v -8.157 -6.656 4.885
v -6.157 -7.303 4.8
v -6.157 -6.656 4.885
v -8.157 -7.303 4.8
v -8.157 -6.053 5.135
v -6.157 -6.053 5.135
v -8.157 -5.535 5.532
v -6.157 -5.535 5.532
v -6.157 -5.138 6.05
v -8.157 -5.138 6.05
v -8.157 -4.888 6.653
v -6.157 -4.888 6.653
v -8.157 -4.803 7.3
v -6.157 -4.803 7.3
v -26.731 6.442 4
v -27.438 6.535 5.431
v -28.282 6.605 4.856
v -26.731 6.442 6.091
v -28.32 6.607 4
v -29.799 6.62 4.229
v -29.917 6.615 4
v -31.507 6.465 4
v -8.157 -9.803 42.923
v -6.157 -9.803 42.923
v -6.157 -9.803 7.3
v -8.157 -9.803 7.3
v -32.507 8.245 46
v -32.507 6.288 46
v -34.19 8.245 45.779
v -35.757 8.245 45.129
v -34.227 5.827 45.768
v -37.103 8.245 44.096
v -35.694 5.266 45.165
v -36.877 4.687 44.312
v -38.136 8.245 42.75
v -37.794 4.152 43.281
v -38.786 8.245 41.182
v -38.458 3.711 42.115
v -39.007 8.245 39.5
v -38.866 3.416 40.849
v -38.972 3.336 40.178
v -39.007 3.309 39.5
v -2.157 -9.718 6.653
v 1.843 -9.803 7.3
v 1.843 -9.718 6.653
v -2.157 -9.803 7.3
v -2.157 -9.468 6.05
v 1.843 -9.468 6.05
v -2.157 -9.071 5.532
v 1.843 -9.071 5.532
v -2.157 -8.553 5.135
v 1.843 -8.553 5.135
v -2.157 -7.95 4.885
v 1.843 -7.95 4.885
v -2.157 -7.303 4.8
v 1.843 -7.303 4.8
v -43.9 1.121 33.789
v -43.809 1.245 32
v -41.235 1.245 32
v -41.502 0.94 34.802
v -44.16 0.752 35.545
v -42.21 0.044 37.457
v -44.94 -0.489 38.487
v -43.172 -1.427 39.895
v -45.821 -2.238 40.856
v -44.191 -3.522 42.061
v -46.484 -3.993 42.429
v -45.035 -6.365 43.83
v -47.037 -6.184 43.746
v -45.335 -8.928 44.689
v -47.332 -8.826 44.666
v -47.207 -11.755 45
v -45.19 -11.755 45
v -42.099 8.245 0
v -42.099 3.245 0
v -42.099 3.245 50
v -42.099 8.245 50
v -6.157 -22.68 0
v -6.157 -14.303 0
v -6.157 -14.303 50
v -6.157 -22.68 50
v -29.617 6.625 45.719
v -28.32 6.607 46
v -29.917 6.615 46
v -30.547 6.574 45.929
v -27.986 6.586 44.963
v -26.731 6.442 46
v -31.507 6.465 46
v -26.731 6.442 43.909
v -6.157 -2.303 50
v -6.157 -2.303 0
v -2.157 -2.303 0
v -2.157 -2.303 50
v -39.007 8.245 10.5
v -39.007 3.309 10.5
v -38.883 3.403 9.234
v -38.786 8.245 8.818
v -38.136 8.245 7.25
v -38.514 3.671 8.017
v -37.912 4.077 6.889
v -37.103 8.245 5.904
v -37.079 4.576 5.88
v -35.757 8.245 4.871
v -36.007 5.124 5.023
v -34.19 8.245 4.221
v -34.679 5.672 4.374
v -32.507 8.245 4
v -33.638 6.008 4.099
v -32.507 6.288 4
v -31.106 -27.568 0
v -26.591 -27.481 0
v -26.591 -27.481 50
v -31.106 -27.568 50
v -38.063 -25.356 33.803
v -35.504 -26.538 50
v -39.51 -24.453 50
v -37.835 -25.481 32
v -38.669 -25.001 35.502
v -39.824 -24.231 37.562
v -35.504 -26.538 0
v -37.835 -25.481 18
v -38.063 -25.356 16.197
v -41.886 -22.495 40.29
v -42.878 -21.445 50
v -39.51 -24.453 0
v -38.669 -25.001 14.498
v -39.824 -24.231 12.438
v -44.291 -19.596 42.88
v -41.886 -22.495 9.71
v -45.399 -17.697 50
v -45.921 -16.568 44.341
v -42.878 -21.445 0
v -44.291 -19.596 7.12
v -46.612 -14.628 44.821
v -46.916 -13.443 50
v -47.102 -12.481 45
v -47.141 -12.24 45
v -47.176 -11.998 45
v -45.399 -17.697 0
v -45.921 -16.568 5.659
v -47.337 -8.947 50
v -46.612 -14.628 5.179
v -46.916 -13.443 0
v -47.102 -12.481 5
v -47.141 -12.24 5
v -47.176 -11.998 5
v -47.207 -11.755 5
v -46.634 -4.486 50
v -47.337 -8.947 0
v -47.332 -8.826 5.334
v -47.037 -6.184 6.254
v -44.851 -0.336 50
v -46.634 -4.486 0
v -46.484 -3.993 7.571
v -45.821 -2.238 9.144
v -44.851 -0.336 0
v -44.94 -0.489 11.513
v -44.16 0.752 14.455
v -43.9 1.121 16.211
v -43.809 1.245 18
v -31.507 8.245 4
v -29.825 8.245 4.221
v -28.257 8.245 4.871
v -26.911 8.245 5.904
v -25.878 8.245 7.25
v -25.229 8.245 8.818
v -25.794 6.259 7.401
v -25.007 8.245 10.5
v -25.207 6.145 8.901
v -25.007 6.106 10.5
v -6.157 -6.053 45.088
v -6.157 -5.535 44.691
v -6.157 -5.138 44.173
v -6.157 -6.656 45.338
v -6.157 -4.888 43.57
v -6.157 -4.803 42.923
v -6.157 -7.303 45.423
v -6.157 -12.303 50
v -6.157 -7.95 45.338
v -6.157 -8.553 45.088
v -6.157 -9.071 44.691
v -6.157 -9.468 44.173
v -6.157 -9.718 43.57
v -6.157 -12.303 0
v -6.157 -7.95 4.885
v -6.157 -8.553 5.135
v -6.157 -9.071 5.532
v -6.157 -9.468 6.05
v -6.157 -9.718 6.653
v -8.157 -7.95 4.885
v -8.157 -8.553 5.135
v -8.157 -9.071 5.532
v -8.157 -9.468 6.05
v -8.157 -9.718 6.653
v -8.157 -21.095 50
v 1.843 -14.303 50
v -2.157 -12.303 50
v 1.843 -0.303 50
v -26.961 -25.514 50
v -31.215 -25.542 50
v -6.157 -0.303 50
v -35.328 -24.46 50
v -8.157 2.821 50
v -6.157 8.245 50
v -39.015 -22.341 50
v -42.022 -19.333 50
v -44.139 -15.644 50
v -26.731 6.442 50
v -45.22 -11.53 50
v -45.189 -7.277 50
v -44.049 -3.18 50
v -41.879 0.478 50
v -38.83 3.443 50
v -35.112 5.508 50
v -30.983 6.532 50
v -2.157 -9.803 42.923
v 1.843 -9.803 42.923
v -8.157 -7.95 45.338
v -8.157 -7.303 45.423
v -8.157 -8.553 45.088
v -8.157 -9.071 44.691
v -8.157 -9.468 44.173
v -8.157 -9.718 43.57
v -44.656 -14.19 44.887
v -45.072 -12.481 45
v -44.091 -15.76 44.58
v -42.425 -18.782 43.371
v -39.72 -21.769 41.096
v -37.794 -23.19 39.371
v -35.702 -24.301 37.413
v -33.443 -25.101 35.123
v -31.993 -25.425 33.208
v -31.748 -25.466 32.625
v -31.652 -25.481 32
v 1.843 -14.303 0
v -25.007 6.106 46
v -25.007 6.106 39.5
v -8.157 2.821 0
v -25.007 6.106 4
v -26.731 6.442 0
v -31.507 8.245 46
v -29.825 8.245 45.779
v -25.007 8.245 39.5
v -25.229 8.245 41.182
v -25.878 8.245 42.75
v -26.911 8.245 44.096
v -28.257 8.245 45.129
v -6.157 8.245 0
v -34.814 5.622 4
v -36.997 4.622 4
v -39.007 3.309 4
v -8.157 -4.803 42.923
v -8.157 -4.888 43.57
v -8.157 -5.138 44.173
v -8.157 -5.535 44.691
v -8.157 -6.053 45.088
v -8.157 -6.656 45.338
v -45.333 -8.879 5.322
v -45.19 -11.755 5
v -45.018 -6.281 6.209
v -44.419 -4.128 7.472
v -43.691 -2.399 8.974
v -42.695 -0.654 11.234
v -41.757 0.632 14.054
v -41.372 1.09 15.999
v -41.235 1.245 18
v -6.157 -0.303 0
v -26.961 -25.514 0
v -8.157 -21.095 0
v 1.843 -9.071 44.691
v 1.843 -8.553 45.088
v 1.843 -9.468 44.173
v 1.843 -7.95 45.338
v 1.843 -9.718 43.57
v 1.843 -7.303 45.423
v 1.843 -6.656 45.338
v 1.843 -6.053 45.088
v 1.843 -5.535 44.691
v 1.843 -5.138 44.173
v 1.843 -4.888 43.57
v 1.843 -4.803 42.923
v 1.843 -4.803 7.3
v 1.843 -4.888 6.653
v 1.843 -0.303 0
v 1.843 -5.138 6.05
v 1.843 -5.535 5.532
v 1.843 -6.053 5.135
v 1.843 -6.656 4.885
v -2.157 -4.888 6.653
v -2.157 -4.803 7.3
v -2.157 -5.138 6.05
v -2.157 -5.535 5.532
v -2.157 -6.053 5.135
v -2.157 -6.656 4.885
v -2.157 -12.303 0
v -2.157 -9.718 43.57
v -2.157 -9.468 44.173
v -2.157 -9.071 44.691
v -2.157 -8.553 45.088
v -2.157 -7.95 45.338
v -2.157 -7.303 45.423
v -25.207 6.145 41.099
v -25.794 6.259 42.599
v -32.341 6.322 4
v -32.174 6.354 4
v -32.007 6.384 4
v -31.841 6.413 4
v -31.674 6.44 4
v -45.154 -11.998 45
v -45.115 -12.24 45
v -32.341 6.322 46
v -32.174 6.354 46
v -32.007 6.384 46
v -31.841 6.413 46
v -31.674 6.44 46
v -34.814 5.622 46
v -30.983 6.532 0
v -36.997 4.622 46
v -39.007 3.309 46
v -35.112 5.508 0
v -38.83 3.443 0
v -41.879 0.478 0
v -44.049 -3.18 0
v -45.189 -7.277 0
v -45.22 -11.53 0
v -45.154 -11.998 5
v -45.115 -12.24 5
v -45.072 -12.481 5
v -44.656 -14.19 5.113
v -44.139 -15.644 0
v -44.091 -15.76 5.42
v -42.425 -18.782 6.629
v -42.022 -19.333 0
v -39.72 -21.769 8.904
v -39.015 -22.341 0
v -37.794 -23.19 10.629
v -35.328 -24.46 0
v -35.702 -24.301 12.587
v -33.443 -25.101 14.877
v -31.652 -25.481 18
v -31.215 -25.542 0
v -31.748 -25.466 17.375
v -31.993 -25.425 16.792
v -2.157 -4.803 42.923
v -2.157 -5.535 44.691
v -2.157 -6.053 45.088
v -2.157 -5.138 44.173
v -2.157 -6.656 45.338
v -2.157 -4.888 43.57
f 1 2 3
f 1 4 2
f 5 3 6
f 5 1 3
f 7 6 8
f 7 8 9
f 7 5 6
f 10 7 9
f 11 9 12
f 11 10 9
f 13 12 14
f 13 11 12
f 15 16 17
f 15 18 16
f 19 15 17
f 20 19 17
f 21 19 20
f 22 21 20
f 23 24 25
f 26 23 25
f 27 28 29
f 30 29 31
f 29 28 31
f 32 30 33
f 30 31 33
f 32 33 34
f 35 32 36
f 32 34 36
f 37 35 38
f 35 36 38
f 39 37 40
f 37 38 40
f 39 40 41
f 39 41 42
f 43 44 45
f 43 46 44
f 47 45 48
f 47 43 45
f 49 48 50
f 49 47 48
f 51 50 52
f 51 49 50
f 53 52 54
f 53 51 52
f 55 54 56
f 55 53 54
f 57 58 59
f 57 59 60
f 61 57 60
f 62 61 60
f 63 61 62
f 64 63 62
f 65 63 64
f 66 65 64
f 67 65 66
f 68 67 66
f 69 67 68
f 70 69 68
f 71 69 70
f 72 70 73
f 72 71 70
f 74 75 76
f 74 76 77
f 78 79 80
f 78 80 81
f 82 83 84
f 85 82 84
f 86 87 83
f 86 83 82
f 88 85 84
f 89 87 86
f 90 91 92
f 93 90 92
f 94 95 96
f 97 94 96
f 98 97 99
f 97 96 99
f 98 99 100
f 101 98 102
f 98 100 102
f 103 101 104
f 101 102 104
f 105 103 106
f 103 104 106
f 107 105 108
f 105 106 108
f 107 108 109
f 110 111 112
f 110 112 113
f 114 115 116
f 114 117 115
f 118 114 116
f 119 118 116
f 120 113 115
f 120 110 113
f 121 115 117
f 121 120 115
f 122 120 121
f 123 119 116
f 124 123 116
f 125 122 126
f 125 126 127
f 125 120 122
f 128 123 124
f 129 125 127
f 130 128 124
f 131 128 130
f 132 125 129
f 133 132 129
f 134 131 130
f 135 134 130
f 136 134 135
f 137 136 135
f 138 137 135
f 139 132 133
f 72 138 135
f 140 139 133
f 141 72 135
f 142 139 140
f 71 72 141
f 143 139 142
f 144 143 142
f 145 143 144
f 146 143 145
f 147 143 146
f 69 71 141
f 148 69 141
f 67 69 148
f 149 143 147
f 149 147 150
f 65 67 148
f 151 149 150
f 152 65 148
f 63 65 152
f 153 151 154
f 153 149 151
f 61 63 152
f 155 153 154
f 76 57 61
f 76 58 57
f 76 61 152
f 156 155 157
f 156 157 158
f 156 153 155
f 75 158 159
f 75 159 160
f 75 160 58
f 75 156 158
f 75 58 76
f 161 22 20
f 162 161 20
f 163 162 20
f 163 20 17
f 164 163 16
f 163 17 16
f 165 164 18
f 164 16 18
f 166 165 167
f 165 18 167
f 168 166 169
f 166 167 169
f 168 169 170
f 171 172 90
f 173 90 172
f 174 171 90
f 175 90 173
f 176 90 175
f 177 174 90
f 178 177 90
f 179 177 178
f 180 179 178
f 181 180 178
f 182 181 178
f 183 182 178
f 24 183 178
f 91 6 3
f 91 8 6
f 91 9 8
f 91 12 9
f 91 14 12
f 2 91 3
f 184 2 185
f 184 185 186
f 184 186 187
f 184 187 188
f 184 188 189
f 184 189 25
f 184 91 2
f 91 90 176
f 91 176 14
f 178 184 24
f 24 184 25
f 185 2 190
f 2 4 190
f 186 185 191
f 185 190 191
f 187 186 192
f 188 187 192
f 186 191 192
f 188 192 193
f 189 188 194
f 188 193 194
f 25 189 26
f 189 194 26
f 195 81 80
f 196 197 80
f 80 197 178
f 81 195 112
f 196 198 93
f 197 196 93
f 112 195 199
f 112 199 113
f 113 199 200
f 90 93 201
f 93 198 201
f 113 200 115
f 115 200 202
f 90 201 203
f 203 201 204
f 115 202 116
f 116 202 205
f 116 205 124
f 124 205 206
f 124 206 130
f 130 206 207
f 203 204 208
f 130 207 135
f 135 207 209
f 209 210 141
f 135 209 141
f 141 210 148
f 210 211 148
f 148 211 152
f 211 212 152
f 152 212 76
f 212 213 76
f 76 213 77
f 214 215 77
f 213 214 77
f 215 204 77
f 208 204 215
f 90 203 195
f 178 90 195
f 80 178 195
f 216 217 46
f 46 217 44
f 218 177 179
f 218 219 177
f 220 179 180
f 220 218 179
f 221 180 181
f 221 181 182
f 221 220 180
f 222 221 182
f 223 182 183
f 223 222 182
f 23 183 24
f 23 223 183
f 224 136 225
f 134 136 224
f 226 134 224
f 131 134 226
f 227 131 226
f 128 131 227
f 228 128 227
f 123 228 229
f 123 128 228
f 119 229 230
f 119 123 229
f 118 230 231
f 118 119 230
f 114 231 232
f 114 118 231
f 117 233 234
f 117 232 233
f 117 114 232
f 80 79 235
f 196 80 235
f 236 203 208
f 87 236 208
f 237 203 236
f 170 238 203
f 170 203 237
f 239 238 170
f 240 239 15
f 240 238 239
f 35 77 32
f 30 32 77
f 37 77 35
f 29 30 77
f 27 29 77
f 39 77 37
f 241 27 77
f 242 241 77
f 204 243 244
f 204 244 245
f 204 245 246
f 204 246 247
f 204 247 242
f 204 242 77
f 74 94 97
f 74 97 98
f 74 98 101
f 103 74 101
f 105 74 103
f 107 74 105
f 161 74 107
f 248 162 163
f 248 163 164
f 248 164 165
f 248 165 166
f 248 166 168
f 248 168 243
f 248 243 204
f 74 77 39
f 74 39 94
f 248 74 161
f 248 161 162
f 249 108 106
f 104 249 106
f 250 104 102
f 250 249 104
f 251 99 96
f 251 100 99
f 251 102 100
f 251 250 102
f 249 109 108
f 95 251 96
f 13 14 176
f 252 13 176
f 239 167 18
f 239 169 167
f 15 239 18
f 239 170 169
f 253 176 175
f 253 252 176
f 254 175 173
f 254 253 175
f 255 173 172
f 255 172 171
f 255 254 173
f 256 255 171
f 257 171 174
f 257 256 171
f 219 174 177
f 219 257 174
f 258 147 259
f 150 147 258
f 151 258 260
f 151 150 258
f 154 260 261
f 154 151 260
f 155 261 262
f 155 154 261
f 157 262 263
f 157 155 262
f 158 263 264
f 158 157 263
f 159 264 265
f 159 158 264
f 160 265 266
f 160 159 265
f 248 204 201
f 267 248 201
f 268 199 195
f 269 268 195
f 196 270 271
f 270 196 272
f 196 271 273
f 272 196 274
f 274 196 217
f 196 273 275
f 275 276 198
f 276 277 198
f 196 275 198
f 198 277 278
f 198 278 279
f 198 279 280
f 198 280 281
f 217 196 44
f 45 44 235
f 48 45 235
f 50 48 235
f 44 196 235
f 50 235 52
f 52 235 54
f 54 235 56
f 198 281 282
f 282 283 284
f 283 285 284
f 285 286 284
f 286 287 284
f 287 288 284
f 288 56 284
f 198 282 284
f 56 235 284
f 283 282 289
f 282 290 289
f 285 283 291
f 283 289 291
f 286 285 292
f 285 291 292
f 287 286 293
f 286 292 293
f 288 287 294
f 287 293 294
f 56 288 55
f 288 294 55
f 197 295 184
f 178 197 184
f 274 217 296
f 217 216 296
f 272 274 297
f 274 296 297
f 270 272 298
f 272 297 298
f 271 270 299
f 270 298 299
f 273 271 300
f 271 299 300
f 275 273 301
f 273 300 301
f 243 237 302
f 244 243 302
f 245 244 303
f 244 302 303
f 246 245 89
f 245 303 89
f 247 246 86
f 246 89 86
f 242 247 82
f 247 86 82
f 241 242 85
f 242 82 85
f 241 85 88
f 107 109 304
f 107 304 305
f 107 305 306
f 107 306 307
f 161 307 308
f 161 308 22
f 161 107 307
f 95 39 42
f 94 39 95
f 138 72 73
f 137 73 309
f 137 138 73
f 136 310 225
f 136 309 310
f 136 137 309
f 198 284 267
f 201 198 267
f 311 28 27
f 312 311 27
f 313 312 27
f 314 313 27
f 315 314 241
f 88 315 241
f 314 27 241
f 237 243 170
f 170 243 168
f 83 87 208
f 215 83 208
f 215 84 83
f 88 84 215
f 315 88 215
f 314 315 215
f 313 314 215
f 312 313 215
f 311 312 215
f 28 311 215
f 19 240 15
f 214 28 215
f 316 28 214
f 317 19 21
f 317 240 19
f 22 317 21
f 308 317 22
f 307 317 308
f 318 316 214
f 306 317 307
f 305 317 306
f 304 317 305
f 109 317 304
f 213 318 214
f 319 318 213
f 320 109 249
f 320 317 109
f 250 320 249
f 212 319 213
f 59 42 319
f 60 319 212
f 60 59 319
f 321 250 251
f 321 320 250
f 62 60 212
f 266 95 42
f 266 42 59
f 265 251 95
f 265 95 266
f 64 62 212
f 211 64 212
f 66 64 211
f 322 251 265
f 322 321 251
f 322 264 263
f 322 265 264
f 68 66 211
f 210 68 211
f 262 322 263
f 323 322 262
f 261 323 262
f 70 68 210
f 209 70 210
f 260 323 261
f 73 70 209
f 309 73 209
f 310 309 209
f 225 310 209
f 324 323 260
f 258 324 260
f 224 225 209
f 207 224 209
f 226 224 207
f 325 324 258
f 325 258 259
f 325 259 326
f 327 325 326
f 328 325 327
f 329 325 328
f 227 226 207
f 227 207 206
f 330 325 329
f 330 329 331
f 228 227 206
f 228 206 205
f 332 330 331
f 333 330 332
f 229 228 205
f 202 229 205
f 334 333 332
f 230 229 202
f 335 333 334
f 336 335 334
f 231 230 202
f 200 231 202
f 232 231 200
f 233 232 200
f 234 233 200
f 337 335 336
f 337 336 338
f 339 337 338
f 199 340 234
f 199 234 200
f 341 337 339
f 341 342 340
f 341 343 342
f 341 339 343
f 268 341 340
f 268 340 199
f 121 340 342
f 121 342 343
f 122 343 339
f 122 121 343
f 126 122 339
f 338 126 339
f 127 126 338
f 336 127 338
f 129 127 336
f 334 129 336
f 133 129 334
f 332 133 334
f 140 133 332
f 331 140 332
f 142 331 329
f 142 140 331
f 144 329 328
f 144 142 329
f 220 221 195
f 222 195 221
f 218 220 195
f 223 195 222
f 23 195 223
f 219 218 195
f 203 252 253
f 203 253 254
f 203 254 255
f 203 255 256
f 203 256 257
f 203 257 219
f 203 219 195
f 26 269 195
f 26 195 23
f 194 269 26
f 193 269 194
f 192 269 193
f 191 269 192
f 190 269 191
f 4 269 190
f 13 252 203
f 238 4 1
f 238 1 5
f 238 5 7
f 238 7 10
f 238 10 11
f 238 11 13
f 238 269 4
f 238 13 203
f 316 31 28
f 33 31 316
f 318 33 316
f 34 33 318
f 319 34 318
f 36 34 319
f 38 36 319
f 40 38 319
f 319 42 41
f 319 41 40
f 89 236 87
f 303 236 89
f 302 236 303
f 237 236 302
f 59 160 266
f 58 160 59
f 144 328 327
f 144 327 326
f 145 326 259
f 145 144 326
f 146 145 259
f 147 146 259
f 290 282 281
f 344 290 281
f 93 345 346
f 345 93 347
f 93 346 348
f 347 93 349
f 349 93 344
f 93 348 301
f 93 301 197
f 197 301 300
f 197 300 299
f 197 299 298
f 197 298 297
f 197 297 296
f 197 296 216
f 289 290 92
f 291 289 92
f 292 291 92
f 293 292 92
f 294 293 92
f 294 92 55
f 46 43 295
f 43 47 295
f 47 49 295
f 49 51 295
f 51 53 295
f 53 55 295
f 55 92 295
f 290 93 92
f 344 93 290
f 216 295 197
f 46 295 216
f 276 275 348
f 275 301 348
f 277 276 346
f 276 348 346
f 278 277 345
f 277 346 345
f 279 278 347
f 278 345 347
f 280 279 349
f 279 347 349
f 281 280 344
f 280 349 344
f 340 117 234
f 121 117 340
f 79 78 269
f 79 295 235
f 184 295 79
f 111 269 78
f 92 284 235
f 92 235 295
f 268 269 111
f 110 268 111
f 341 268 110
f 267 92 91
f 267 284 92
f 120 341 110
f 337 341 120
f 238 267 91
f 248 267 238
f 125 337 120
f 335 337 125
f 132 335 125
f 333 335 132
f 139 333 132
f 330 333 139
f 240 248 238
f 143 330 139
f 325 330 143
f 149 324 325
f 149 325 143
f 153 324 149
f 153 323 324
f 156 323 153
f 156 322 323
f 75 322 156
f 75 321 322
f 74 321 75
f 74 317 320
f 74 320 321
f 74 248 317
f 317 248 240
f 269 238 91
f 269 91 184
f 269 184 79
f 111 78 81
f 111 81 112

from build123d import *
from OCP.BRepAlgoAPI import BRepAlgoAPI_Cut
from OCP.TopTools import TopTools_ListOfShape

# Parameters (mm, degrees)
SALIENTE_EXTRUIR1_DEPTH     = 50
SALIENTE_EXTRUIR2_DEPTH     = 50
CORTAR_EXTRUIR12_REACH      = 77.399
REDONDEO1_R                 = 2.5
CORTAR_EXTRUIR17_REACH      = 77.931
CORTAR_EXTRUIR17_END_RADIUS = 16.15
CORTAR_EXTRUIR19_REACH      = 79.662
CROQUIS18_W                 = 7
CROQUIS18_H                 = 42
CORTAR_EXTRUIR22_REACH      = 79.662
CORTAR_EXTRUIR22_END_RADIUS = 16.15
CROQUIS22_W                 = 7
CROQUIS22_H                 = 42
REDONDEO10_START            = 3.308867588
REDONDEO10_DEPTH            = 4.936164621
REDONDEO10_START_2          = 6.105712769
REDONDEO10_2_DEPTH          = 2.13931944
REDONDEO10_START_3          = 4
REDONDEO10_3_DEPTH          = 42


with BuildPart() as part:
    # Croquis3 → Saliente-Extruir1 (new body)
    with BuildSketch(Plane.XY):
        with BuildLine():
            Line((-42.099195701, 8.245032209), (-6.157247249, 8.245032209))
            Line((-6.157247249, 8.245032209), (-6.157247249, -22.679560551))
            Line((-6.157247249, -22.679560551), (-26.590955846, -27.481197975))
            ThreePointArc((-26.590955846, -27.481197975), (-45.398833914, -17.697170572), (-42.099195701, 3.245032209))
            Line((-42.099195701, 3.245032209), (-42.099195701, 8.245032209))
        make_face()
        with BuildLine():
            Line((-8.157247249, 2.82108494), (-26.731262437, 6.441781026))
            ThreePointArc((-26.731262437, 6.441781026), (-45.345288804, -9.402744466), (-26.961453667, -25.513783269))
            Line((-26.961453667, -25.513783269), (-8.157247249, -21.095056202))
            Line((-8.157247249, -21.095056202), (-8.157247249, 2.82108494))
        make_face(mode=Mode.SUBTRACT)
    extrude(amount=SALIENTE_EXTRUIR1_DEPTH)

    # Croquis11 → Saliente-Extruir2 (add)
    with BuildSketch(Plane(origin=(0, 0, 0), x_dir=(-1, 0, 0), z_dir=(0, 0, -1))):
        Polygon((-1.842752751, -14.302804028), (-1.842752751, -0.302804028), (6.157247249, -0.302804028), (6.157247249, -2.302804028), (2.157247249, -2.302804028), (2.157247249, -12.302804028), (6.157247249, -12.302804028), (6.157247249, -14.302804028), align=None)
    extrude(amount=-SALIENTE_EXTRUIR2_DEPTH)

    # Cortar-Extruir12: up to this face of the body (flat: up to its plane)
    cortar_extruir12_end = Plane(part.part.faces().sort_by_distance((-8.157247249, -9.136985631, 25))[0])
    # Croquis12 → Cortar-Extruir12 (cut, up to the picked face)
    with BuildSketch(Plane(origin=(1.842752751, 0, 0), x_dir=(0, 0, -1), z_dir=(1, 0, 0)), mode=Mode.PRIVATE) as cortar_extruir12_sk1:
        Polygon((-25, -9.802804028), (-4.8, -9.802804028), (-4.8, -4.802804028), (-45.42287301, -4.802804028), (-45.42287301, -9.802804028), align=None)
    cortar_extruir12_tool1 = split(extrude(cortar_extruir12_sk1.sketch, amount=-CORTAR_EXTRUIR12_REACH, mode=Mode.PRIVATE), bisect_by=cortar_extruir12_end, keep=Keep.BOTH, mode=Mode.PRIVATE)
    add(cortar_extruir12_tool1.solids().sort_by(Axis((1.842753, -7.302804, 25.111437), (-1, 0, 0)))[0], mode=Mode.SUBTRACT)

    # Redondeo1
    redondeo1_edges = [part.edges().sort_by_distance(p)[0] for p in [
        (-0.157247249, -4.802804028, 4.8),
        (-0.157247249, -9.802804028, 4.8),
        (-0.157247249, -9.802804028, 45.42287301),
        (-0.157247249, -4.802804028, 45.42287301),
        (-7.157247249, -9.802804028, 4.8),
        (-7.157247249, -4.802804028, 4.8),
        (-7.157247249, -9.802804028, 45.42287301),
        (-7.157247249, -4.802804028, 45.42287301),
    ]]
    fillet(redondeo1_edges, radius=REDONDEO1_R - 0.0001)  # a hair under: the kernel refuses the full size

    # Cortar-Extruir17: up to this cylinder (the profile starts outside it)
    cortar_extruir17_end = Plane(origin=(-29.1957078, -9.519077631, 25), z_dir=(0, 0, -1)) * Cylinder(CORTAR_EXTRUIR17_END_RADIUS, 189.162, mode=Mode.PRIVATE)
    # Croquis16 → Cortar-Extruir17 (cut, up to the surface)
    with BuildSketch(Plane.ZY.offset(48.157247249), mode=Mode.PRIVATE) as cortar_extruir17_sk1:
        with BuildLine():
            Line((32, -25.481197975), (18, -25.481197975))
            ThreePointArc((18, -25.481197975), (8.807611845, -21.67358613), (5, -12.481197975))
            Line((5, -12.481197975), (5, -11.754967791))
            ThreePointArc((5, -11.754967791), (8.807611845, -2.562579636), (18, 1.245032209))
            Line((18, 1.245032209), (32, 1.245032209))
            ThreePointArc((32, 1.245032209), (41.192388155, -2.562579636), (45, -11.754967791))
            Line((45, -11.754967791), (45, -12.481197975))
            ThreePointArc((45, -12.481197975), (41.192388155, -21.67358613), (32, -25.481197975))
        make_face()
    cortar_extruir17_tool1 = extrude(cortar_extruir17_sk1.sketch, amount=-CORTAR_EXTRUIR17_REACH, mode=Mode.PRIVATE) - cortar_extruir17_end
    add(cortar_extruir17_tool1.solids().sort_by_distance((-48.157247, -12.118083, 25))[0], mode=Mode.SUBTRACT)

    # Croquis18 → Cortar-Extruir19 (cut, up to next)
    with BuildSketch(Plane(origin=(0, 8.245032209, 0), x_dir=(1, 0, 0), z_dir=(0, 1, 0)), mode=Mode.PRIVATE) as cortar_extruir19_sk1:
        with Locations((-28.507247249, -25)):
            Rectangle(CROQUIS18_W, CROQUIS18_H)
    cortar_extruir19_tool1 = extrude(cortar_extruir19_sk1.sketch, amount=-CORTAR_EXTRUIR19_REACH, mode=Mode.PRIVATE) & part.part
    add(cortar_extruir19_tool1.solids().sort_by_distance((-28.507247, 8.245032, 25))[0], mode=Mode.SUBTRACT)

    # Cortar-Extruir22: up to this cylinder (the profile starts outside it)
    cortar_extruir22_end = Plane(origin=(-29.1957078, -9.519077631, 25), z_dir=(0, 0, -1)) * Cylinder(CORTAR_EXTRUIR22_END_RADIUS, 192.624, mode=Mode.PRIVATE)
    # Croquis22 → Cortar-Extruir22 (cut, up to the surface)
    with BuildSketch(Plane(origin=(0, 8.245032209, 0), x_dir=(1, 0, 0), z_dir=(0, 1, 0)), mode=Mode.PRIVATE) as cortar_extruir22_sk1:
        with Locations((-35.507247249, -25)):
            Rectangle(CROQUIS22_W, CROQUIS22_H)
    cortar_extruir22_tool1 = extrude(cortar_extruir22_sk1.sketch, amount=-CORTAR_EXTRUIR22_REACH, mode=Mode.PRIVATE) - cortar_extruir22_end
    add(cortar_extruir22_tool1.solids().sort_by_distance((-35.507247, 8.245032, 25))[0], mode=Mode.SUBTRACT)


with BuildPart() as redondeo10_tool:
    # Redondeo10: read off the stored shape, not the designer's step
    # Redondeo10 outline → Redondeo10 (new body)
    with BuildSketch(Plane(origin=(0, 0, 0), x_dir=(1, 0, 0), z_dir=(0, 1, 0)).offset(REDONDEO10_START)):
        with BuildLine():
            Line((-39.007247249, -4), (-39.007247249, -10.5))
            ThreePointArc((-39.007247249, -10.5), (-37.103441327, -5.903805922), (-32.507247249, -4))
            Line((-32.507247249, -4), (-39.007247249, -4))
        make_face()
        with BuildLine():
            ThreePointArc((-32.507247249, -46), (-37.103441327, -44.096194078), (-39.007247249, -39.5))
            Line((-39.007247249, -39.5), (-39.007247249, -46))
            Line((-39.007247249, -46), (-32.507247249, -46))
        make_face()
    extrude(amount=REDONDEO10_DEPTH)


with BuildPart() as part_1:
    add(part.part)


with BuildPart() as part_2:
    # Redondeo10: joined with redondeo10_tool
    add(part_1.part.fuse(redondeo10_tool.part, tol=0.00001))


with BuildPart() as redondeo10_2_tool:
    # Redondeo10 2 outline → Redondeo10 2 (new body)
    with BuildSketch(Plane(origin=(0, 0, 0), x_dir=(1, 0, 0), z_dir=(0, 1, 0)).offset(REDONDEO10_START_2)):
        with BuildLine():
            Line((-25.007247249, -4), (-31.507247249, -4))
            ThreePointArc((-31.507247249, -4), (-26.911053171, -5.903805922), (-25.007247249, -10.5))
            Line((-25.007247249, -10.5), (-25.007247249, -4))
        make_face()
        with BuildLine():
            ThreePointArc((-25.007247249, -39.5), (-26.911053171, -44.096194078), (-31.507247249, -46))
            Line((-31.507247249, -46), (-25.007247249, -46))
            Line((-25.007247249, -46), (-25.007247249, -39.5))
        make_face()
    extrude(amount=REDONDEO10_2_DEPTH)


with BuildPart() as part_3:
    add(part_2.part)


with BuildPart() as part_4:
    # Redondeo10 2: joined with redondeo10_2_tool
    add(part_3.part.fuse(redondeo10_2_tool.part, tol=0.00001))


with BuildPart() as redondeo10_3_tool:
    # Redondeo10 3 outline → Redondeo10 3 (new body)
    with BuildSketch(Plane.XY.offset(REDONDEO10_START_3)):
        with BuildLine():
            Line((-39.007247249, 3.308868177), (-32.507247249, 3.308867588))
            Line((-32.507247249, 3.308867588), (-32.507247249, 6.287762866))
            ThreePointArc((-32.507247249, 6.287762866), (-35.924173697, 5.162551934), (-39.007247249, 3.308868177))
        make_face()
        with BuildLine():
            Line((-31.507247249, 6.105712769), (-25.007247249, 6.105712769))
            Line((-25.007247249, 6.105712769), (-26.731262437, 6.441781026))
            ThreePointArc((-26.731262437, 6.441781026), (-29.118405097, 6.630737362), (-31.507247249, 6.464641754))
            Line((-31.507247249, 6.464641754), (-31.507247249, 6.105712769))
        make_face()
    extrude(amount=REDONDEO10_3_DEPTH)


with BuildPart() as part_5:
    add(part_4.part)

    # Redondeo10 3: cut by redondeo10_3_tool, with a tolerance
    redondeo10_3_stock = TopTools_ListOfShape()
    redondeo10_3_stock.Append(part_5.part.wrapped)
    redondeo10_3_tools = TopTools_ListOfShape()
    redondeo10_3_tools.Append(redondeo10_3_tool.part.wrapped)
    redondeo10_3_cut = BRepAlgoAPI_Cut()
    redondeo10_3_cut.SetArguments(redondeo10_3_stock)
    redondeo10_3_cut.SetTools(redondeo10_3_tools)
    redondeo10_3_cut.SetFuzzyValue(0.00001)
    redondeo10_3_cut.Build()
    add(Compound.cast(redondeo10_3_cut.Shape()).solids(), mode=Mode.REPLACE)


solid = part_5.part
